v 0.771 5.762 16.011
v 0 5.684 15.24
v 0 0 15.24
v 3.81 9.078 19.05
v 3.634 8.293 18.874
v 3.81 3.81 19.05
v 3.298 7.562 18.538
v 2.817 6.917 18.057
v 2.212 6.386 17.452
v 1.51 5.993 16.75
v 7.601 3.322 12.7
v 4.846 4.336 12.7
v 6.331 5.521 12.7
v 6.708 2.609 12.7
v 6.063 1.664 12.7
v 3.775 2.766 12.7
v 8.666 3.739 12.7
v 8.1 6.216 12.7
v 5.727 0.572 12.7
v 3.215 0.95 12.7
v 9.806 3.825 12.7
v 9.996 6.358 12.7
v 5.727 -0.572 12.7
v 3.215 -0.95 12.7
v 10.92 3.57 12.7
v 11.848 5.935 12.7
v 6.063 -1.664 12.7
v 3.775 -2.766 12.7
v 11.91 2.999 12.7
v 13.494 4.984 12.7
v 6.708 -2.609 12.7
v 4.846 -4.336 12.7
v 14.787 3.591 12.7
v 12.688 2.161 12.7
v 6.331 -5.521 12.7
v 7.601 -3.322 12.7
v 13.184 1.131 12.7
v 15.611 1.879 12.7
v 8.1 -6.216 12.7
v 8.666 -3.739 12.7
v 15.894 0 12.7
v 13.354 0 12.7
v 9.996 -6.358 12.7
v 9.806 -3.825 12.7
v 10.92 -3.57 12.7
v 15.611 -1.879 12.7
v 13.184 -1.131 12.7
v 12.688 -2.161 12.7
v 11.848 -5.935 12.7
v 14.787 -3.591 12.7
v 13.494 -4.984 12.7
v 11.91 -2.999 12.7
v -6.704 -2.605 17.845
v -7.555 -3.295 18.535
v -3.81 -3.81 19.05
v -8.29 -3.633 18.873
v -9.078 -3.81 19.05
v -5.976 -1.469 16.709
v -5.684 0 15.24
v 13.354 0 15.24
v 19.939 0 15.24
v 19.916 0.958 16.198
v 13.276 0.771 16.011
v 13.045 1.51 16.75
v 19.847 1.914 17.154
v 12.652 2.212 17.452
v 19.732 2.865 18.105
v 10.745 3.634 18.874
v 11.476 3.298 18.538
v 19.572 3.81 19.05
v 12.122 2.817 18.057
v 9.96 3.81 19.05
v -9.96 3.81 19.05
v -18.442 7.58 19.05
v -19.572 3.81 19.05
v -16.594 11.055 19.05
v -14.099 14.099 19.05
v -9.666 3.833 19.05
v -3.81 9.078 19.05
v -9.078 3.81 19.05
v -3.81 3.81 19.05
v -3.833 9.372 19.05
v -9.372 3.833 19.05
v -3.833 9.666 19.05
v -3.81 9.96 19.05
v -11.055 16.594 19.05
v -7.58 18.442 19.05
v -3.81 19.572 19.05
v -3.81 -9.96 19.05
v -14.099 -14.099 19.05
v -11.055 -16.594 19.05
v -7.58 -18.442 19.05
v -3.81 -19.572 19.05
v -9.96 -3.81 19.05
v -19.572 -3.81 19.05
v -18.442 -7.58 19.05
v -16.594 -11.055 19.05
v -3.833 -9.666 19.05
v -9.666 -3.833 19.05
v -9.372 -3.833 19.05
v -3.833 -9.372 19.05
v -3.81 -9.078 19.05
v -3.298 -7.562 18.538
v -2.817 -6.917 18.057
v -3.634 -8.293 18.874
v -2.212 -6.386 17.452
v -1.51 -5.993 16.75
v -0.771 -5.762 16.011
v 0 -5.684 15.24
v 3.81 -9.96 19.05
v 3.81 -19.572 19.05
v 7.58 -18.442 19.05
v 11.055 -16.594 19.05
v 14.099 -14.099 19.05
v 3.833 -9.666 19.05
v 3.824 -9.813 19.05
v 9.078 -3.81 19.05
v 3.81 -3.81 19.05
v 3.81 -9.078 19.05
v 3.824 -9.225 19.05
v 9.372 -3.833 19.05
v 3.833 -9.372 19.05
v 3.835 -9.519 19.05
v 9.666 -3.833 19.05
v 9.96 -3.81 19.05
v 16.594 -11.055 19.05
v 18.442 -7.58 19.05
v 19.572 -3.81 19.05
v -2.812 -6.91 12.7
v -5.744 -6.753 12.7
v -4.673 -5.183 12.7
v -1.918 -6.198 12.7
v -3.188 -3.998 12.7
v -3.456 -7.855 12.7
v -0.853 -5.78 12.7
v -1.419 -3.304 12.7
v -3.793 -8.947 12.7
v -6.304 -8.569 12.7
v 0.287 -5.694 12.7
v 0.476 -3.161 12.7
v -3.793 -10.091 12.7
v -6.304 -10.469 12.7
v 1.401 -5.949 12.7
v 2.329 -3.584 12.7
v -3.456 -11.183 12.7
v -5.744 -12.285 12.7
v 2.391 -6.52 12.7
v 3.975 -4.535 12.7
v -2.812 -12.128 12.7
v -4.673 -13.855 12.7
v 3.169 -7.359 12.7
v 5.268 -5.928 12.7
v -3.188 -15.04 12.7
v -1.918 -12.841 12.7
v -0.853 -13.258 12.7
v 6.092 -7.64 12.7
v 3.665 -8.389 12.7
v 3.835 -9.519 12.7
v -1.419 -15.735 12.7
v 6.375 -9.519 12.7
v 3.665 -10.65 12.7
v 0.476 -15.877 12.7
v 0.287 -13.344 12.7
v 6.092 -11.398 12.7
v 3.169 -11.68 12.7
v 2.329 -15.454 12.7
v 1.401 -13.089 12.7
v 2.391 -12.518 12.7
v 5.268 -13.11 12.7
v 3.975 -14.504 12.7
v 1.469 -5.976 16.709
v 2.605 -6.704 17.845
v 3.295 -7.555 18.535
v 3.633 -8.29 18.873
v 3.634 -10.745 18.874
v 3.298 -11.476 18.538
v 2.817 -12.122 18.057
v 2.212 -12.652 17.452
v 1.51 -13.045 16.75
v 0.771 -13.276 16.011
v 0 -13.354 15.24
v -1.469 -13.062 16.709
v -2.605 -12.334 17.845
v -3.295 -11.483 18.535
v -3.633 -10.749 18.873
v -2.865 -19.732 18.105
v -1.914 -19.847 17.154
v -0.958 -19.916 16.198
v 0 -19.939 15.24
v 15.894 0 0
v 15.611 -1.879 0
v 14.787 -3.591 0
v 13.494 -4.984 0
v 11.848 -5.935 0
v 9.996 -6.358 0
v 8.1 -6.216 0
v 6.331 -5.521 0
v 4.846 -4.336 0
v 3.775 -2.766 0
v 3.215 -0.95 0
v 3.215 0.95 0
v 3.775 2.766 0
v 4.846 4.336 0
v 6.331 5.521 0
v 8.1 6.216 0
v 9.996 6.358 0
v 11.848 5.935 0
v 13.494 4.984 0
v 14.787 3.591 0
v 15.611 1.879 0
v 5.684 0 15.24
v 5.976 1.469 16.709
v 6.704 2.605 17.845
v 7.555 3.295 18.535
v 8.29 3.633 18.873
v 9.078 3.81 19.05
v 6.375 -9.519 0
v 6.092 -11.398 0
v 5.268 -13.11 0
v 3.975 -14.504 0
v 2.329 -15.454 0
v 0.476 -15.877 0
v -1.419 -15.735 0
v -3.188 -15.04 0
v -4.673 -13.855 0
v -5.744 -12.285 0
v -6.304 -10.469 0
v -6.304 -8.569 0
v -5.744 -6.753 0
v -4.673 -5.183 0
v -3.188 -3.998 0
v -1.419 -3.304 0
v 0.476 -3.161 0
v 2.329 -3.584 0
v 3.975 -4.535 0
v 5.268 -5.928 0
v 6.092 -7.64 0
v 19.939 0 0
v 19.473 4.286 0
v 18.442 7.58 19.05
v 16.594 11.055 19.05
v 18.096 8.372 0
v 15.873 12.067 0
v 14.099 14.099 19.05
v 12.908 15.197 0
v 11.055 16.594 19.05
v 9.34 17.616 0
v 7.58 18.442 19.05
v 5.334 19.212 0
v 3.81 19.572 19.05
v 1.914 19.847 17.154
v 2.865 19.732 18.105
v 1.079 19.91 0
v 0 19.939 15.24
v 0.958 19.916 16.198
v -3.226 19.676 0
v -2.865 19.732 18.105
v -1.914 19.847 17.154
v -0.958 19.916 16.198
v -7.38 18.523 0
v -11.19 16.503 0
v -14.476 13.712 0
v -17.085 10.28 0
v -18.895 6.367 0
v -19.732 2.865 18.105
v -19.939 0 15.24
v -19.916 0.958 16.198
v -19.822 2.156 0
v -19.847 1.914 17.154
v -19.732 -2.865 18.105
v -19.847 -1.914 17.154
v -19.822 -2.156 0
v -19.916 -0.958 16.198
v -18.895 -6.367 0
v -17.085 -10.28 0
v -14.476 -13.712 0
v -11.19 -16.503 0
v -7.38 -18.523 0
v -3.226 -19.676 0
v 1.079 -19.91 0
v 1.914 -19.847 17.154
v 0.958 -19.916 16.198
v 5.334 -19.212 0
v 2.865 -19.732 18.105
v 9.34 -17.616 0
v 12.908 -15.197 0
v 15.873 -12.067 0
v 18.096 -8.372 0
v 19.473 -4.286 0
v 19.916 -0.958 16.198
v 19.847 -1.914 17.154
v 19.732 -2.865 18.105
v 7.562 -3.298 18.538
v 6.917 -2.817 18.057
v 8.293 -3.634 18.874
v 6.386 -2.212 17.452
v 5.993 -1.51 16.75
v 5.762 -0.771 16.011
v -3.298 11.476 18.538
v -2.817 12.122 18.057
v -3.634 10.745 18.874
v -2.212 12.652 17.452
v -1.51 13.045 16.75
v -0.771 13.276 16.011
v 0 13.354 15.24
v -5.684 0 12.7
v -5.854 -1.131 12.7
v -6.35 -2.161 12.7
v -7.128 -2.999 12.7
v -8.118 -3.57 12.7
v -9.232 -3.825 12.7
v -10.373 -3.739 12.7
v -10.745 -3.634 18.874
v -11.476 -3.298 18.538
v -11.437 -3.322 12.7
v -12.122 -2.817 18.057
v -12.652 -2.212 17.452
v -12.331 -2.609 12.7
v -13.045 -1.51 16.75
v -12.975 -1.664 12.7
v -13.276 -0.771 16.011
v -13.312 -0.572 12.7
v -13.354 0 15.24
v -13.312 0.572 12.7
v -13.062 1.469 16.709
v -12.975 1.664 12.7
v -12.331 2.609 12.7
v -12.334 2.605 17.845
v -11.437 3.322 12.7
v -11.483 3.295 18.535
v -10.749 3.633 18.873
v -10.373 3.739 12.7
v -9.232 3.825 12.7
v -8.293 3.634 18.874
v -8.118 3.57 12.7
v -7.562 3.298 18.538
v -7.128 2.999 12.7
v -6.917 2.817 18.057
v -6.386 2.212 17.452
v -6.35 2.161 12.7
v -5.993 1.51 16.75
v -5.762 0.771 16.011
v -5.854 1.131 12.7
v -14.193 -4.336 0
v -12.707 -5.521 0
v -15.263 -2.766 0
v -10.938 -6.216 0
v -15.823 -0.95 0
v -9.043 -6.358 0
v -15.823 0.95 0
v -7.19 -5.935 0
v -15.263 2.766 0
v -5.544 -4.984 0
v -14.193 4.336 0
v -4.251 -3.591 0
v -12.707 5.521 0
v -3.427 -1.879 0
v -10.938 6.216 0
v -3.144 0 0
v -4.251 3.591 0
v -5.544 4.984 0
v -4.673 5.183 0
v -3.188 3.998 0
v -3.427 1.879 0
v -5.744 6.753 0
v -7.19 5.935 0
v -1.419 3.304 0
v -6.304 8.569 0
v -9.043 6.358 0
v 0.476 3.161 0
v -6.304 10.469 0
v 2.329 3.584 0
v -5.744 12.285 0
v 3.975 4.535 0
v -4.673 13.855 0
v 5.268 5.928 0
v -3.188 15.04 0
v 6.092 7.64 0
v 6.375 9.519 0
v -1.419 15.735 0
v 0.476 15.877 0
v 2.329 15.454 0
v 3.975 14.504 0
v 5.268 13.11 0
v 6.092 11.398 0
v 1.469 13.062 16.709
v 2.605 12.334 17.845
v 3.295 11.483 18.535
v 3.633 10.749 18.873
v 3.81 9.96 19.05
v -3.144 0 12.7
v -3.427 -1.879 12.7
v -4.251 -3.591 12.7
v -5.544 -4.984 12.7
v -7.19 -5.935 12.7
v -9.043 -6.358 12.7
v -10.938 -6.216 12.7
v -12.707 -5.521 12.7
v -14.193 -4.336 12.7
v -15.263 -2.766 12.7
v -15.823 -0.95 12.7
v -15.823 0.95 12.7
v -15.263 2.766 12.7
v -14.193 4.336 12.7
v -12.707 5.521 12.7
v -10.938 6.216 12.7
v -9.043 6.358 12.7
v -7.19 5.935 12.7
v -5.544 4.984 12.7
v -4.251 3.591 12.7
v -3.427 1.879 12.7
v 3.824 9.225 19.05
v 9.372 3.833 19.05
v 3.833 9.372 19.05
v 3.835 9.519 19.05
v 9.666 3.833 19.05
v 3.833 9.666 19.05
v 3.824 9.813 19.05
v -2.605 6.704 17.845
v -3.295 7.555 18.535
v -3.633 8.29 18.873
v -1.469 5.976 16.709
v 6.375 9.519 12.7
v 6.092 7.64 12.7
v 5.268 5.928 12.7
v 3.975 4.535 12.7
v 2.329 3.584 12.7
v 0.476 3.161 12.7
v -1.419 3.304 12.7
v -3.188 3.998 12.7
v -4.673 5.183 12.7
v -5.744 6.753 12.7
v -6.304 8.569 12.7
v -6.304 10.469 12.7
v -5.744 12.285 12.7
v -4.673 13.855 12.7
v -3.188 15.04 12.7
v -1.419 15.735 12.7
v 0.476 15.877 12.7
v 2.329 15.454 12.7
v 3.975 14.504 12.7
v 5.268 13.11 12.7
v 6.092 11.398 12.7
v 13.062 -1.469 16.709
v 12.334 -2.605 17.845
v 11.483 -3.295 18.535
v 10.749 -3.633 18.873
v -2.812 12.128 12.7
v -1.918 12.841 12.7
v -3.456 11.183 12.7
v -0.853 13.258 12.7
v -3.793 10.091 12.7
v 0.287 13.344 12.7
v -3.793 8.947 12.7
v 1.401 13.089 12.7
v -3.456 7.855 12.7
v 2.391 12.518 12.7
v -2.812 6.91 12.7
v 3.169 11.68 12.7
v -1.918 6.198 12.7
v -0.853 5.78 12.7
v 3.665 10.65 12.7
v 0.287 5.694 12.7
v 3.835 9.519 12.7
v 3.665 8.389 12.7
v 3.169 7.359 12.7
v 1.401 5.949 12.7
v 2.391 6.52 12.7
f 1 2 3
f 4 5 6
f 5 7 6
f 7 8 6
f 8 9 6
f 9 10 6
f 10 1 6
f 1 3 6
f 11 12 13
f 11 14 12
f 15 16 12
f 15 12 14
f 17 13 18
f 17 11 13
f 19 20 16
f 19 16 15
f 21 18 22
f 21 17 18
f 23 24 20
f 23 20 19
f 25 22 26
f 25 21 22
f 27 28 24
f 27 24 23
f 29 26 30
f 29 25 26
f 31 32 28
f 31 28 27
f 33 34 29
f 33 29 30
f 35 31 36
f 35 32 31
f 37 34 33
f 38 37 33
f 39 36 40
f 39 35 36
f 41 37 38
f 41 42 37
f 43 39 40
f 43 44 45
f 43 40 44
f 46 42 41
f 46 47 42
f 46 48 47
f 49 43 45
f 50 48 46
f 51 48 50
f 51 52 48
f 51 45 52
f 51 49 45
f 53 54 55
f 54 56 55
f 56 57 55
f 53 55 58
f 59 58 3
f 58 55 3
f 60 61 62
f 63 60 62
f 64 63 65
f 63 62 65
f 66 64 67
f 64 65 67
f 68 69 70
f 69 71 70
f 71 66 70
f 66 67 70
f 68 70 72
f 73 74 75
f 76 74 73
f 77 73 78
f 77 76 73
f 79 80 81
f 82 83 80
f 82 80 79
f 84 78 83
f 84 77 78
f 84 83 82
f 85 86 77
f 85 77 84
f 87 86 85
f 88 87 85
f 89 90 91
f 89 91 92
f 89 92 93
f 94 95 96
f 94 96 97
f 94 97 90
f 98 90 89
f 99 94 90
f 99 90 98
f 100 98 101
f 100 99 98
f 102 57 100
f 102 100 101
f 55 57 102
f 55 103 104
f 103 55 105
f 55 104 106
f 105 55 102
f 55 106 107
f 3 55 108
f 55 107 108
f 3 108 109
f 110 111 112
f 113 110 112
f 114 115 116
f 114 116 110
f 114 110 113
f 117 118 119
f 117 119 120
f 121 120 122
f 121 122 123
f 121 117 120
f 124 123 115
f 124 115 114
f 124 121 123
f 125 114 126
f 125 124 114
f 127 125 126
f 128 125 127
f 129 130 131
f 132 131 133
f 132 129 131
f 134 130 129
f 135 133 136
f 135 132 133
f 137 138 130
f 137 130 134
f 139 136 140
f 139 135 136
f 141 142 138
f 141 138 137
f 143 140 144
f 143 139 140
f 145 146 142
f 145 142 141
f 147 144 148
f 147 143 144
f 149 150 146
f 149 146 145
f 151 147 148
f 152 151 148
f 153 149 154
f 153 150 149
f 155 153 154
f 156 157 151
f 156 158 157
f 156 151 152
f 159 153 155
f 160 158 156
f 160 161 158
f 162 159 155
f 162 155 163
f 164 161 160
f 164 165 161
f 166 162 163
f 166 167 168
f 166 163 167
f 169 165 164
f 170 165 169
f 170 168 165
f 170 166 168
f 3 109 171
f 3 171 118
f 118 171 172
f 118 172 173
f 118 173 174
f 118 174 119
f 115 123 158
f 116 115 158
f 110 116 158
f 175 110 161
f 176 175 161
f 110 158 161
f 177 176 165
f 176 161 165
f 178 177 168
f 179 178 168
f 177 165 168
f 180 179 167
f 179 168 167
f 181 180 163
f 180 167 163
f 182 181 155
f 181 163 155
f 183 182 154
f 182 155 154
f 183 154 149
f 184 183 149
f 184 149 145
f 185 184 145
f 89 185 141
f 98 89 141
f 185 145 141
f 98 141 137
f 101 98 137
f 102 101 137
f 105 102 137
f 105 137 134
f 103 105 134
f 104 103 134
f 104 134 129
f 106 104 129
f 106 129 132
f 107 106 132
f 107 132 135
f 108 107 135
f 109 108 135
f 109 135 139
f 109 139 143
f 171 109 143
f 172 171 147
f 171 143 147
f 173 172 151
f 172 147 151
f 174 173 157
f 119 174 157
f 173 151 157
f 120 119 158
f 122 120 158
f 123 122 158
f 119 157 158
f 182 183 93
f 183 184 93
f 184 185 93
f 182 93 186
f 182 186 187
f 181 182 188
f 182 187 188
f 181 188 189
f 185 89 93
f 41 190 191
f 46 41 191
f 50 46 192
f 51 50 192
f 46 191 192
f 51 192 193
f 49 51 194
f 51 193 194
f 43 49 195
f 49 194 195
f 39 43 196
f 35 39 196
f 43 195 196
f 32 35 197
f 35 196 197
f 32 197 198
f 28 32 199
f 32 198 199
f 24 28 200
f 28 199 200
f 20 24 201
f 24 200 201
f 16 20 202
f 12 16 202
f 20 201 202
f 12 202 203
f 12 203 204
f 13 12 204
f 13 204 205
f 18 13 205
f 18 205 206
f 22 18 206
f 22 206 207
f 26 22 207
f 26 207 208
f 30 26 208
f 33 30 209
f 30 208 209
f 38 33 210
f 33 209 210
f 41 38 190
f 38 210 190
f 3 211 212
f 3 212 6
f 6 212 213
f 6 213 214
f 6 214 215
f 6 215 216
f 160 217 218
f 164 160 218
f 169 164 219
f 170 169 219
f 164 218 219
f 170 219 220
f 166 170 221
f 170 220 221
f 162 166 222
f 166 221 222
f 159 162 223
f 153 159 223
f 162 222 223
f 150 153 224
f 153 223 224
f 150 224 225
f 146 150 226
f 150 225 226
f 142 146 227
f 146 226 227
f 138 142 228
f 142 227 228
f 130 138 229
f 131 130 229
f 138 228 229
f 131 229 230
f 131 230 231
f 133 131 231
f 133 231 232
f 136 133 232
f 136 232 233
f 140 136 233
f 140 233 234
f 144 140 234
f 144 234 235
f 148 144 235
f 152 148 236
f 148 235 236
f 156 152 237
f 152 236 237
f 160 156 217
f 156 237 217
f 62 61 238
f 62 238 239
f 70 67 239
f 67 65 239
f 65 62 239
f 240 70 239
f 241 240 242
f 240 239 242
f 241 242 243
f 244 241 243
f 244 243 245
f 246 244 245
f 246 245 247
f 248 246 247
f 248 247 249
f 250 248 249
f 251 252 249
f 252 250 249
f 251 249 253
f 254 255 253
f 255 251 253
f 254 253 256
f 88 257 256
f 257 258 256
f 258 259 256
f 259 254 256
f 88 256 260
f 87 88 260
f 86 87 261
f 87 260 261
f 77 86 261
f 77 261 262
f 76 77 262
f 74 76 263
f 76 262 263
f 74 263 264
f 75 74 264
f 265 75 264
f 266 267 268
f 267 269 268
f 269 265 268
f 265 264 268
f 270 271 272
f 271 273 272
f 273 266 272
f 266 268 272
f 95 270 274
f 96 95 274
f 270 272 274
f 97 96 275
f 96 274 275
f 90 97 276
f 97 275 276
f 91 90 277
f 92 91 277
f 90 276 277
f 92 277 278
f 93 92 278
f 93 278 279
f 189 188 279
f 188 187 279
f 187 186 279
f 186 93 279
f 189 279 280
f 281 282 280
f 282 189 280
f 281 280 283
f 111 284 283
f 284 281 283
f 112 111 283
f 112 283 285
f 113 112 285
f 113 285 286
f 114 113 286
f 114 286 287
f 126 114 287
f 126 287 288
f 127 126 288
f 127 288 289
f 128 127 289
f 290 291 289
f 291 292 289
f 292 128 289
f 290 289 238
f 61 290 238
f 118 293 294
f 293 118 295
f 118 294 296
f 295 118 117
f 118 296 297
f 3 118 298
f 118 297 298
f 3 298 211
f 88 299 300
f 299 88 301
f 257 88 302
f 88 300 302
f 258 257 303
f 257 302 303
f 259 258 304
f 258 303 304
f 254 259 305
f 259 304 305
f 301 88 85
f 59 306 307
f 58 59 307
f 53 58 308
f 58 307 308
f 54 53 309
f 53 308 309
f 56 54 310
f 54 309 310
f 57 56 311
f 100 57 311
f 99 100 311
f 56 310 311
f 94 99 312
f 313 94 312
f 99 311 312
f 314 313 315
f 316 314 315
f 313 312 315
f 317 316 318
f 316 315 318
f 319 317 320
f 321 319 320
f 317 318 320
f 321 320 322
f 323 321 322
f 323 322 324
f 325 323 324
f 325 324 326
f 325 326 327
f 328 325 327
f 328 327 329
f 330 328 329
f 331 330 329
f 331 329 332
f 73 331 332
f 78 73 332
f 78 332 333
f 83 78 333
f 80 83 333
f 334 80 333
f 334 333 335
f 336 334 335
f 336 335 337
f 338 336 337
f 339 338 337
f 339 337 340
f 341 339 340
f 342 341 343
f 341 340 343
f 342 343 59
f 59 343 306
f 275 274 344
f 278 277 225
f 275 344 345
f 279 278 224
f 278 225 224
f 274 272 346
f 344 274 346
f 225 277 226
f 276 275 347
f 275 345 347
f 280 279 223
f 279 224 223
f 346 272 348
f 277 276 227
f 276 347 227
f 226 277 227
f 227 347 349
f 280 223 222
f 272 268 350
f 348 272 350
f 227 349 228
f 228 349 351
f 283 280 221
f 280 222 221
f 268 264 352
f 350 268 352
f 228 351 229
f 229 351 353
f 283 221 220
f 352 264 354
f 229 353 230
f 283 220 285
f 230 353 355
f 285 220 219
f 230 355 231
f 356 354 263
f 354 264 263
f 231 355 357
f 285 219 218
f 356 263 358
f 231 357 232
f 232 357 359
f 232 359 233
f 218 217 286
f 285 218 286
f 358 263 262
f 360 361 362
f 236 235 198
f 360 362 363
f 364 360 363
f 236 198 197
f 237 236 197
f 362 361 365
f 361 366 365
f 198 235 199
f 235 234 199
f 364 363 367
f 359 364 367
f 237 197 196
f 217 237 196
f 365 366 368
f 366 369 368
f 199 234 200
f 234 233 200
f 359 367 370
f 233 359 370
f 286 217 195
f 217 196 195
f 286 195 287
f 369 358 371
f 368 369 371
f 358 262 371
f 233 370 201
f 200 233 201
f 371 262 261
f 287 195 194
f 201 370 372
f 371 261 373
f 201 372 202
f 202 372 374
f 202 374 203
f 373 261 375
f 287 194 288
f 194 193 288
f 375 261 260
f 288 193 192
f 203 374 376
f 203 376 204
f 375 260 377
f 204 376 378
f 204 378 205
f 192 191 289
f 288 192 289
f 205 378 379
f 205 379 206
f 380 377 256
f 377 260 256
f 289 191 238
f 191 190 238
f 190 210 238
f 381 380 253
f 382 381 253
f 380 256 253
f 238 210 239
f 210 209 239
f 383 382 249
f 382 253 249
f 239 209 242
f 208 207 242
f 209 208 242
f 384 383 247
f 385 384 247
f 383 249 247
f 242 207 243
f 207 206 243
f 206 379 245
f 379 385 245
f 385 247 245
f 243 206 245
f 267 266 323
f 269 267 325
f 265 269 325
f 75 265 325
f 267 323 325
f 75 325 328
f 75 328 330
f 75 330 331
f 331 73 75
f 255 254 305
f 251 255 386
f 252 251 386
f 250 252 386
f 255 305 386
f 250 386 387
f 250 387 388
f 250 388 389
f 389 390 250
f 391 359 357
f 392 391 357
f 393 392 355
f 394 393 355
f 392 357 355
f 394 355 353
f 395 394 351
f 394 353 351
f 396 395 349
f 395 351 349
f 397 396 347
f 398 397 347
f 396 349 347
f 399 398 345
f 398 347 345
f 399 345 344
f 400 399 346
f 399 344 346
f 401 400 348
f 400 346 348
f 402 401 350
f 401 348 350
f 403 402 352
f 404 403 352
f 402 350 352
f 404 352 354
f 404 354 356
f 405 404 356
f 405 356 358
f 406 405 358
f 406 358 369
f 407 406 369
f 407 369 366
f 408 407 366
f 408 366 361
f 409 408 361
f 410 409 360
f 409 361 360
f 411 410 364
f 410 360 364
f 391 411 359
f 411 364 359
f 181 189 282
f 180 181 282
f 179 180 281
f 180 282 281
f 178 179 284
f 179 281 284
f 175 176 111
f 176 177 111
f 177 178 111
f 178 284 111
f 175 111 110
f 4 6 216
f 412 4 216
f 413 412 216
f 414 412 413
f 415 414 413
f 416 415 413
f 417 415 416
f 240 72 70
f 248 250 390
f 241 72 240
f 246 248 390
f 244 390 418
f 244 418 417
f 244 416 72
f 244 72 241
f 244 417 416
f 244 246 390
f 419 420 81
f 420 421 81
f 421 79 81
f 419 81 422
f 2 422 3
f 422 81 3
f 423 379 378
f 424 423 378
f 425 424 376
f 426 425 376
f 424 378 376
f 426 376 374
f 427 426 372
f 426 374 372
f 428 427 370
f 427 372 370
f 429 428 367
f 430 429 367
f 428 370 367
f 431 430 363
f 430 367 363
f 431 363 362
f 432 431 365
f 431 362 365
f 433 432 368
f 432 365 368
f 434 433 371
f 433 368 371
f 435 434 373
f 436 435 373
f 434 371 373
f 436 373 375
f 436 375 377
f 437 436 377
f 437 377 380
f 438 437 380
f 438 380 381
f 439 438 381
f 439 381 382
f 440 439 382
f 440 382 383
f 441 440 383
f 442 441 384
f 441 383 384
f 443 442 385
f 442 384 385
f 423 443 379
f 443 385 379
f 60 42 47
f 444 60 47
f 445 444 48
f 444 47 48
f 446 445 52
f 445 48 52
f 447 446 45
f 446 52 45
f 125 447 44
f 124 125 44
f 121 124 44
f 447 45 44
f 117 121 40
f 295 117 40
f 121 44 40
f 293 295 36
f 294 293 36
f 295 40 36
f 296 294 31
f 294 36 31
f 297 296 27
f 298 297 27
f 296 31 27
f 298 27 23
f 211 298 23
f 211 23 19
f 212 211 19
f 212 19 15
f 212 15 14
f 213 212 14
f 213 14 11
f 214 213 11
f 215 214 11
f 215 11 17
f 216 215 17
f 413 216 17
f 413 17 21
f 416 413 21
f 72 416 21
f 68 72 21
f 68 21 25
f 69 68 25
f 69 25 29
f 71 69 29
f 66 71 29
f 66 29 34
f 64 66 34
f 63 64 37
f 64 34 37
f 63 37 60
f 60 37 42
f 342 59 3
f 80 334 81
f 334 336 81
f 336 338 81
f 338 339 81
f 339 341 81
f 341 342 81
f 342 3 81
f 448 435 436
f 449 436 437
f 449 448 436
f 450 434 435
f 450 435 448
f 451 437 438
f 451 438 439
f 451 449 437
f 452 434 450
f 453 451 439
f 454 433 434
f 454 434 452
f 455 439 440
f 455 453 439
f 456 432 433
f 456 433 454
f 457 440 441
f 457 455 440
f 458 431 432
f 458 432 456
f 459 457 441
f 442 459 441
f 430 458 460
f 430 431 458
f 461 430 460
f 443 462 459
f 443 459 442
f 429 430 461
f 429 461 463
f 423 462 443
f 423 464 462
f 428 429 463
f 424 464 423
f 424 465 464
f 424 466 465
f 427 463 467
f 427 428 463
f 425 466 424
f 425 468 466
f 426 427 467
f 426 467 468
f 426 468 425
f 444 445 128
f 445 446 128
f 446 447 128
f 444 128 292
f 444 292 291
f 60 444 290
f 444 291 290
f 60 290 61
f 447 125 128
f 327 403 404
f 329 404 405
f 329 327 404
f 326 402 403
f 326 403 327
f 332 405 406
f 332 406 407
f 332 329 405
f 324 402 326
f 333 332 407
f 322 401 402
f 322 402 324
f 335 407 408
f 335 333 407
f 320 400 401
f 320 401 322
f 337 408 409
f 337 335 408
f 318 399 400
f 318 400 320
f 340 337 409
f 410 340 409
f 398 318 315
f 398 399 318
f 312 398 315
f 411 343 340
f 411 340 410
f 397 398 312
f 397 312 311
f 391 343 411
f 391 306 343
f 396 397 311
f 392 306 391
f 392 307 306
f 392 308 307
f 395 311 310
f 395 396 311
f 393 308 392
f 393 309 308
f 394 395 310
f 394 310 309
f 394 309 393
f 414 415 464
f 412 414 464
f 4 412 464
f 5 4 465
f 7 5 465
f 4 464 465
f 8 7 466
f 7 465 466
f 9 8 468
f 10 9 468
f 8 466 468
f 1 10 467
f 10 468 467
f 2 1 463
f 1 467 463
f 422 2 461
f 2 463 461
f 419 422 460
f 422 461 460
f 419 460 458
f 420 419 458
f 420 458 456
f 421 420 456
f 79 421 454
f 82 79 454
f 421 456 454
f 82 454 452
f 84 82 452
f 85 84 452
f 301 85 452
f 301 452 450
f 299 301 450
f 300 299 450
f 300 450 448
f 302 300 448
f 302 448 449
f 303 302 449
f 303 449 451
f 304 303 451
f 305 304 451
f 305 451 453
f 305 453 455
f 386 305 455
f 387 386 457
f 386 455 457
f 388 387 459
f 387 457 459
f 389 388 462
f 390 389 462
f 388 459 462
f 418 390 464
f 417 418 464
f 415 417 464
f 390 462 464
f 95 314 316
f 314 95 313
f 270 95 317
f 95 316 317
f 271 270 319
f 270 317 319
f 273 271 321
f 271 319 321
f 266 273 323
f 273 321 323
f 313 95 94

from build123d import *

# Parameters (mm, degrees)
F0_R      = 19.939
F1_DEPTH  = 19.05
F3_R      = 6.3754
F4_DEPTH  = 12.7
F5_R      = 3.8354
F6_DEPTH  = 6.351
F8_DEPTH  = 38.1
F10_DEPTH = 38.1


with BuildPart() as f1:
    # F0 (on Top) → F1 (new body)
    with BuildSketch(Plane.XY):
        Circle(F0_R)
    extrude(amount=F1_DEPTH)

    # F3 (on face) → F4 (cut)
    with BuildSketch(Plane(origin=(0, 0, 0), x_dir=(1, 0, 0), z_dir=(0, 0, -1))):
        with Locations((-9.519071, 0)):
            Circle(F3_R)
        with Locations((0, 9.519071)):
            Circle(F3_R)
        with Locations((9.519071, 0)):
            Circle(F3_R)
        with Locations((0, -9.519071)):
            Circle(F3_R)
    extrude(amount=-F4_DEPTH, mode=Mode.SUBTRACT)

    # F5 (on face) → F6 (cut, through all)
    with BuildSketch(Plane(origin=(0, 0, 12.7), x_dir=(1, 0, 0), z_dir=(0, 0, -1))):
        with Locations((0, 9.519071)):
            Circle(F5_R)
        with Locations((-9.519071, 0)):
            Circle(F5_R)
        with Locations((0, -9.519071)):
            Circle(F5_R)
        with Locations((9.519071, 0)):
            Circle(F5_R)
    extrude(amount=-F6_DEPTH, mode=Mode.SUBTRACT)

    # F7 (on Front) → F8 (cut, symmetric)
    with BuildSketch(Plane.XZ):
        Polygon((-8.64362, 23.88362), (0, 15.24), (8.64362, 23.88362), align=None)
    extrude(amount=F8_DEPTH, both=True, mode=Mode.SUBTRACT)

    # F9 (on Right) → F10 (cut, symmetric)
    with BuildSketch(Plane.YZ):
        Polygon((-11.610578, 26.850578), (0, 15.24), (11.610578, 26.850578), align=None)
    extrude(amount=F10_DEPTH, both=True, mode=Mode.SUBTRACT)


solid = f1.part
